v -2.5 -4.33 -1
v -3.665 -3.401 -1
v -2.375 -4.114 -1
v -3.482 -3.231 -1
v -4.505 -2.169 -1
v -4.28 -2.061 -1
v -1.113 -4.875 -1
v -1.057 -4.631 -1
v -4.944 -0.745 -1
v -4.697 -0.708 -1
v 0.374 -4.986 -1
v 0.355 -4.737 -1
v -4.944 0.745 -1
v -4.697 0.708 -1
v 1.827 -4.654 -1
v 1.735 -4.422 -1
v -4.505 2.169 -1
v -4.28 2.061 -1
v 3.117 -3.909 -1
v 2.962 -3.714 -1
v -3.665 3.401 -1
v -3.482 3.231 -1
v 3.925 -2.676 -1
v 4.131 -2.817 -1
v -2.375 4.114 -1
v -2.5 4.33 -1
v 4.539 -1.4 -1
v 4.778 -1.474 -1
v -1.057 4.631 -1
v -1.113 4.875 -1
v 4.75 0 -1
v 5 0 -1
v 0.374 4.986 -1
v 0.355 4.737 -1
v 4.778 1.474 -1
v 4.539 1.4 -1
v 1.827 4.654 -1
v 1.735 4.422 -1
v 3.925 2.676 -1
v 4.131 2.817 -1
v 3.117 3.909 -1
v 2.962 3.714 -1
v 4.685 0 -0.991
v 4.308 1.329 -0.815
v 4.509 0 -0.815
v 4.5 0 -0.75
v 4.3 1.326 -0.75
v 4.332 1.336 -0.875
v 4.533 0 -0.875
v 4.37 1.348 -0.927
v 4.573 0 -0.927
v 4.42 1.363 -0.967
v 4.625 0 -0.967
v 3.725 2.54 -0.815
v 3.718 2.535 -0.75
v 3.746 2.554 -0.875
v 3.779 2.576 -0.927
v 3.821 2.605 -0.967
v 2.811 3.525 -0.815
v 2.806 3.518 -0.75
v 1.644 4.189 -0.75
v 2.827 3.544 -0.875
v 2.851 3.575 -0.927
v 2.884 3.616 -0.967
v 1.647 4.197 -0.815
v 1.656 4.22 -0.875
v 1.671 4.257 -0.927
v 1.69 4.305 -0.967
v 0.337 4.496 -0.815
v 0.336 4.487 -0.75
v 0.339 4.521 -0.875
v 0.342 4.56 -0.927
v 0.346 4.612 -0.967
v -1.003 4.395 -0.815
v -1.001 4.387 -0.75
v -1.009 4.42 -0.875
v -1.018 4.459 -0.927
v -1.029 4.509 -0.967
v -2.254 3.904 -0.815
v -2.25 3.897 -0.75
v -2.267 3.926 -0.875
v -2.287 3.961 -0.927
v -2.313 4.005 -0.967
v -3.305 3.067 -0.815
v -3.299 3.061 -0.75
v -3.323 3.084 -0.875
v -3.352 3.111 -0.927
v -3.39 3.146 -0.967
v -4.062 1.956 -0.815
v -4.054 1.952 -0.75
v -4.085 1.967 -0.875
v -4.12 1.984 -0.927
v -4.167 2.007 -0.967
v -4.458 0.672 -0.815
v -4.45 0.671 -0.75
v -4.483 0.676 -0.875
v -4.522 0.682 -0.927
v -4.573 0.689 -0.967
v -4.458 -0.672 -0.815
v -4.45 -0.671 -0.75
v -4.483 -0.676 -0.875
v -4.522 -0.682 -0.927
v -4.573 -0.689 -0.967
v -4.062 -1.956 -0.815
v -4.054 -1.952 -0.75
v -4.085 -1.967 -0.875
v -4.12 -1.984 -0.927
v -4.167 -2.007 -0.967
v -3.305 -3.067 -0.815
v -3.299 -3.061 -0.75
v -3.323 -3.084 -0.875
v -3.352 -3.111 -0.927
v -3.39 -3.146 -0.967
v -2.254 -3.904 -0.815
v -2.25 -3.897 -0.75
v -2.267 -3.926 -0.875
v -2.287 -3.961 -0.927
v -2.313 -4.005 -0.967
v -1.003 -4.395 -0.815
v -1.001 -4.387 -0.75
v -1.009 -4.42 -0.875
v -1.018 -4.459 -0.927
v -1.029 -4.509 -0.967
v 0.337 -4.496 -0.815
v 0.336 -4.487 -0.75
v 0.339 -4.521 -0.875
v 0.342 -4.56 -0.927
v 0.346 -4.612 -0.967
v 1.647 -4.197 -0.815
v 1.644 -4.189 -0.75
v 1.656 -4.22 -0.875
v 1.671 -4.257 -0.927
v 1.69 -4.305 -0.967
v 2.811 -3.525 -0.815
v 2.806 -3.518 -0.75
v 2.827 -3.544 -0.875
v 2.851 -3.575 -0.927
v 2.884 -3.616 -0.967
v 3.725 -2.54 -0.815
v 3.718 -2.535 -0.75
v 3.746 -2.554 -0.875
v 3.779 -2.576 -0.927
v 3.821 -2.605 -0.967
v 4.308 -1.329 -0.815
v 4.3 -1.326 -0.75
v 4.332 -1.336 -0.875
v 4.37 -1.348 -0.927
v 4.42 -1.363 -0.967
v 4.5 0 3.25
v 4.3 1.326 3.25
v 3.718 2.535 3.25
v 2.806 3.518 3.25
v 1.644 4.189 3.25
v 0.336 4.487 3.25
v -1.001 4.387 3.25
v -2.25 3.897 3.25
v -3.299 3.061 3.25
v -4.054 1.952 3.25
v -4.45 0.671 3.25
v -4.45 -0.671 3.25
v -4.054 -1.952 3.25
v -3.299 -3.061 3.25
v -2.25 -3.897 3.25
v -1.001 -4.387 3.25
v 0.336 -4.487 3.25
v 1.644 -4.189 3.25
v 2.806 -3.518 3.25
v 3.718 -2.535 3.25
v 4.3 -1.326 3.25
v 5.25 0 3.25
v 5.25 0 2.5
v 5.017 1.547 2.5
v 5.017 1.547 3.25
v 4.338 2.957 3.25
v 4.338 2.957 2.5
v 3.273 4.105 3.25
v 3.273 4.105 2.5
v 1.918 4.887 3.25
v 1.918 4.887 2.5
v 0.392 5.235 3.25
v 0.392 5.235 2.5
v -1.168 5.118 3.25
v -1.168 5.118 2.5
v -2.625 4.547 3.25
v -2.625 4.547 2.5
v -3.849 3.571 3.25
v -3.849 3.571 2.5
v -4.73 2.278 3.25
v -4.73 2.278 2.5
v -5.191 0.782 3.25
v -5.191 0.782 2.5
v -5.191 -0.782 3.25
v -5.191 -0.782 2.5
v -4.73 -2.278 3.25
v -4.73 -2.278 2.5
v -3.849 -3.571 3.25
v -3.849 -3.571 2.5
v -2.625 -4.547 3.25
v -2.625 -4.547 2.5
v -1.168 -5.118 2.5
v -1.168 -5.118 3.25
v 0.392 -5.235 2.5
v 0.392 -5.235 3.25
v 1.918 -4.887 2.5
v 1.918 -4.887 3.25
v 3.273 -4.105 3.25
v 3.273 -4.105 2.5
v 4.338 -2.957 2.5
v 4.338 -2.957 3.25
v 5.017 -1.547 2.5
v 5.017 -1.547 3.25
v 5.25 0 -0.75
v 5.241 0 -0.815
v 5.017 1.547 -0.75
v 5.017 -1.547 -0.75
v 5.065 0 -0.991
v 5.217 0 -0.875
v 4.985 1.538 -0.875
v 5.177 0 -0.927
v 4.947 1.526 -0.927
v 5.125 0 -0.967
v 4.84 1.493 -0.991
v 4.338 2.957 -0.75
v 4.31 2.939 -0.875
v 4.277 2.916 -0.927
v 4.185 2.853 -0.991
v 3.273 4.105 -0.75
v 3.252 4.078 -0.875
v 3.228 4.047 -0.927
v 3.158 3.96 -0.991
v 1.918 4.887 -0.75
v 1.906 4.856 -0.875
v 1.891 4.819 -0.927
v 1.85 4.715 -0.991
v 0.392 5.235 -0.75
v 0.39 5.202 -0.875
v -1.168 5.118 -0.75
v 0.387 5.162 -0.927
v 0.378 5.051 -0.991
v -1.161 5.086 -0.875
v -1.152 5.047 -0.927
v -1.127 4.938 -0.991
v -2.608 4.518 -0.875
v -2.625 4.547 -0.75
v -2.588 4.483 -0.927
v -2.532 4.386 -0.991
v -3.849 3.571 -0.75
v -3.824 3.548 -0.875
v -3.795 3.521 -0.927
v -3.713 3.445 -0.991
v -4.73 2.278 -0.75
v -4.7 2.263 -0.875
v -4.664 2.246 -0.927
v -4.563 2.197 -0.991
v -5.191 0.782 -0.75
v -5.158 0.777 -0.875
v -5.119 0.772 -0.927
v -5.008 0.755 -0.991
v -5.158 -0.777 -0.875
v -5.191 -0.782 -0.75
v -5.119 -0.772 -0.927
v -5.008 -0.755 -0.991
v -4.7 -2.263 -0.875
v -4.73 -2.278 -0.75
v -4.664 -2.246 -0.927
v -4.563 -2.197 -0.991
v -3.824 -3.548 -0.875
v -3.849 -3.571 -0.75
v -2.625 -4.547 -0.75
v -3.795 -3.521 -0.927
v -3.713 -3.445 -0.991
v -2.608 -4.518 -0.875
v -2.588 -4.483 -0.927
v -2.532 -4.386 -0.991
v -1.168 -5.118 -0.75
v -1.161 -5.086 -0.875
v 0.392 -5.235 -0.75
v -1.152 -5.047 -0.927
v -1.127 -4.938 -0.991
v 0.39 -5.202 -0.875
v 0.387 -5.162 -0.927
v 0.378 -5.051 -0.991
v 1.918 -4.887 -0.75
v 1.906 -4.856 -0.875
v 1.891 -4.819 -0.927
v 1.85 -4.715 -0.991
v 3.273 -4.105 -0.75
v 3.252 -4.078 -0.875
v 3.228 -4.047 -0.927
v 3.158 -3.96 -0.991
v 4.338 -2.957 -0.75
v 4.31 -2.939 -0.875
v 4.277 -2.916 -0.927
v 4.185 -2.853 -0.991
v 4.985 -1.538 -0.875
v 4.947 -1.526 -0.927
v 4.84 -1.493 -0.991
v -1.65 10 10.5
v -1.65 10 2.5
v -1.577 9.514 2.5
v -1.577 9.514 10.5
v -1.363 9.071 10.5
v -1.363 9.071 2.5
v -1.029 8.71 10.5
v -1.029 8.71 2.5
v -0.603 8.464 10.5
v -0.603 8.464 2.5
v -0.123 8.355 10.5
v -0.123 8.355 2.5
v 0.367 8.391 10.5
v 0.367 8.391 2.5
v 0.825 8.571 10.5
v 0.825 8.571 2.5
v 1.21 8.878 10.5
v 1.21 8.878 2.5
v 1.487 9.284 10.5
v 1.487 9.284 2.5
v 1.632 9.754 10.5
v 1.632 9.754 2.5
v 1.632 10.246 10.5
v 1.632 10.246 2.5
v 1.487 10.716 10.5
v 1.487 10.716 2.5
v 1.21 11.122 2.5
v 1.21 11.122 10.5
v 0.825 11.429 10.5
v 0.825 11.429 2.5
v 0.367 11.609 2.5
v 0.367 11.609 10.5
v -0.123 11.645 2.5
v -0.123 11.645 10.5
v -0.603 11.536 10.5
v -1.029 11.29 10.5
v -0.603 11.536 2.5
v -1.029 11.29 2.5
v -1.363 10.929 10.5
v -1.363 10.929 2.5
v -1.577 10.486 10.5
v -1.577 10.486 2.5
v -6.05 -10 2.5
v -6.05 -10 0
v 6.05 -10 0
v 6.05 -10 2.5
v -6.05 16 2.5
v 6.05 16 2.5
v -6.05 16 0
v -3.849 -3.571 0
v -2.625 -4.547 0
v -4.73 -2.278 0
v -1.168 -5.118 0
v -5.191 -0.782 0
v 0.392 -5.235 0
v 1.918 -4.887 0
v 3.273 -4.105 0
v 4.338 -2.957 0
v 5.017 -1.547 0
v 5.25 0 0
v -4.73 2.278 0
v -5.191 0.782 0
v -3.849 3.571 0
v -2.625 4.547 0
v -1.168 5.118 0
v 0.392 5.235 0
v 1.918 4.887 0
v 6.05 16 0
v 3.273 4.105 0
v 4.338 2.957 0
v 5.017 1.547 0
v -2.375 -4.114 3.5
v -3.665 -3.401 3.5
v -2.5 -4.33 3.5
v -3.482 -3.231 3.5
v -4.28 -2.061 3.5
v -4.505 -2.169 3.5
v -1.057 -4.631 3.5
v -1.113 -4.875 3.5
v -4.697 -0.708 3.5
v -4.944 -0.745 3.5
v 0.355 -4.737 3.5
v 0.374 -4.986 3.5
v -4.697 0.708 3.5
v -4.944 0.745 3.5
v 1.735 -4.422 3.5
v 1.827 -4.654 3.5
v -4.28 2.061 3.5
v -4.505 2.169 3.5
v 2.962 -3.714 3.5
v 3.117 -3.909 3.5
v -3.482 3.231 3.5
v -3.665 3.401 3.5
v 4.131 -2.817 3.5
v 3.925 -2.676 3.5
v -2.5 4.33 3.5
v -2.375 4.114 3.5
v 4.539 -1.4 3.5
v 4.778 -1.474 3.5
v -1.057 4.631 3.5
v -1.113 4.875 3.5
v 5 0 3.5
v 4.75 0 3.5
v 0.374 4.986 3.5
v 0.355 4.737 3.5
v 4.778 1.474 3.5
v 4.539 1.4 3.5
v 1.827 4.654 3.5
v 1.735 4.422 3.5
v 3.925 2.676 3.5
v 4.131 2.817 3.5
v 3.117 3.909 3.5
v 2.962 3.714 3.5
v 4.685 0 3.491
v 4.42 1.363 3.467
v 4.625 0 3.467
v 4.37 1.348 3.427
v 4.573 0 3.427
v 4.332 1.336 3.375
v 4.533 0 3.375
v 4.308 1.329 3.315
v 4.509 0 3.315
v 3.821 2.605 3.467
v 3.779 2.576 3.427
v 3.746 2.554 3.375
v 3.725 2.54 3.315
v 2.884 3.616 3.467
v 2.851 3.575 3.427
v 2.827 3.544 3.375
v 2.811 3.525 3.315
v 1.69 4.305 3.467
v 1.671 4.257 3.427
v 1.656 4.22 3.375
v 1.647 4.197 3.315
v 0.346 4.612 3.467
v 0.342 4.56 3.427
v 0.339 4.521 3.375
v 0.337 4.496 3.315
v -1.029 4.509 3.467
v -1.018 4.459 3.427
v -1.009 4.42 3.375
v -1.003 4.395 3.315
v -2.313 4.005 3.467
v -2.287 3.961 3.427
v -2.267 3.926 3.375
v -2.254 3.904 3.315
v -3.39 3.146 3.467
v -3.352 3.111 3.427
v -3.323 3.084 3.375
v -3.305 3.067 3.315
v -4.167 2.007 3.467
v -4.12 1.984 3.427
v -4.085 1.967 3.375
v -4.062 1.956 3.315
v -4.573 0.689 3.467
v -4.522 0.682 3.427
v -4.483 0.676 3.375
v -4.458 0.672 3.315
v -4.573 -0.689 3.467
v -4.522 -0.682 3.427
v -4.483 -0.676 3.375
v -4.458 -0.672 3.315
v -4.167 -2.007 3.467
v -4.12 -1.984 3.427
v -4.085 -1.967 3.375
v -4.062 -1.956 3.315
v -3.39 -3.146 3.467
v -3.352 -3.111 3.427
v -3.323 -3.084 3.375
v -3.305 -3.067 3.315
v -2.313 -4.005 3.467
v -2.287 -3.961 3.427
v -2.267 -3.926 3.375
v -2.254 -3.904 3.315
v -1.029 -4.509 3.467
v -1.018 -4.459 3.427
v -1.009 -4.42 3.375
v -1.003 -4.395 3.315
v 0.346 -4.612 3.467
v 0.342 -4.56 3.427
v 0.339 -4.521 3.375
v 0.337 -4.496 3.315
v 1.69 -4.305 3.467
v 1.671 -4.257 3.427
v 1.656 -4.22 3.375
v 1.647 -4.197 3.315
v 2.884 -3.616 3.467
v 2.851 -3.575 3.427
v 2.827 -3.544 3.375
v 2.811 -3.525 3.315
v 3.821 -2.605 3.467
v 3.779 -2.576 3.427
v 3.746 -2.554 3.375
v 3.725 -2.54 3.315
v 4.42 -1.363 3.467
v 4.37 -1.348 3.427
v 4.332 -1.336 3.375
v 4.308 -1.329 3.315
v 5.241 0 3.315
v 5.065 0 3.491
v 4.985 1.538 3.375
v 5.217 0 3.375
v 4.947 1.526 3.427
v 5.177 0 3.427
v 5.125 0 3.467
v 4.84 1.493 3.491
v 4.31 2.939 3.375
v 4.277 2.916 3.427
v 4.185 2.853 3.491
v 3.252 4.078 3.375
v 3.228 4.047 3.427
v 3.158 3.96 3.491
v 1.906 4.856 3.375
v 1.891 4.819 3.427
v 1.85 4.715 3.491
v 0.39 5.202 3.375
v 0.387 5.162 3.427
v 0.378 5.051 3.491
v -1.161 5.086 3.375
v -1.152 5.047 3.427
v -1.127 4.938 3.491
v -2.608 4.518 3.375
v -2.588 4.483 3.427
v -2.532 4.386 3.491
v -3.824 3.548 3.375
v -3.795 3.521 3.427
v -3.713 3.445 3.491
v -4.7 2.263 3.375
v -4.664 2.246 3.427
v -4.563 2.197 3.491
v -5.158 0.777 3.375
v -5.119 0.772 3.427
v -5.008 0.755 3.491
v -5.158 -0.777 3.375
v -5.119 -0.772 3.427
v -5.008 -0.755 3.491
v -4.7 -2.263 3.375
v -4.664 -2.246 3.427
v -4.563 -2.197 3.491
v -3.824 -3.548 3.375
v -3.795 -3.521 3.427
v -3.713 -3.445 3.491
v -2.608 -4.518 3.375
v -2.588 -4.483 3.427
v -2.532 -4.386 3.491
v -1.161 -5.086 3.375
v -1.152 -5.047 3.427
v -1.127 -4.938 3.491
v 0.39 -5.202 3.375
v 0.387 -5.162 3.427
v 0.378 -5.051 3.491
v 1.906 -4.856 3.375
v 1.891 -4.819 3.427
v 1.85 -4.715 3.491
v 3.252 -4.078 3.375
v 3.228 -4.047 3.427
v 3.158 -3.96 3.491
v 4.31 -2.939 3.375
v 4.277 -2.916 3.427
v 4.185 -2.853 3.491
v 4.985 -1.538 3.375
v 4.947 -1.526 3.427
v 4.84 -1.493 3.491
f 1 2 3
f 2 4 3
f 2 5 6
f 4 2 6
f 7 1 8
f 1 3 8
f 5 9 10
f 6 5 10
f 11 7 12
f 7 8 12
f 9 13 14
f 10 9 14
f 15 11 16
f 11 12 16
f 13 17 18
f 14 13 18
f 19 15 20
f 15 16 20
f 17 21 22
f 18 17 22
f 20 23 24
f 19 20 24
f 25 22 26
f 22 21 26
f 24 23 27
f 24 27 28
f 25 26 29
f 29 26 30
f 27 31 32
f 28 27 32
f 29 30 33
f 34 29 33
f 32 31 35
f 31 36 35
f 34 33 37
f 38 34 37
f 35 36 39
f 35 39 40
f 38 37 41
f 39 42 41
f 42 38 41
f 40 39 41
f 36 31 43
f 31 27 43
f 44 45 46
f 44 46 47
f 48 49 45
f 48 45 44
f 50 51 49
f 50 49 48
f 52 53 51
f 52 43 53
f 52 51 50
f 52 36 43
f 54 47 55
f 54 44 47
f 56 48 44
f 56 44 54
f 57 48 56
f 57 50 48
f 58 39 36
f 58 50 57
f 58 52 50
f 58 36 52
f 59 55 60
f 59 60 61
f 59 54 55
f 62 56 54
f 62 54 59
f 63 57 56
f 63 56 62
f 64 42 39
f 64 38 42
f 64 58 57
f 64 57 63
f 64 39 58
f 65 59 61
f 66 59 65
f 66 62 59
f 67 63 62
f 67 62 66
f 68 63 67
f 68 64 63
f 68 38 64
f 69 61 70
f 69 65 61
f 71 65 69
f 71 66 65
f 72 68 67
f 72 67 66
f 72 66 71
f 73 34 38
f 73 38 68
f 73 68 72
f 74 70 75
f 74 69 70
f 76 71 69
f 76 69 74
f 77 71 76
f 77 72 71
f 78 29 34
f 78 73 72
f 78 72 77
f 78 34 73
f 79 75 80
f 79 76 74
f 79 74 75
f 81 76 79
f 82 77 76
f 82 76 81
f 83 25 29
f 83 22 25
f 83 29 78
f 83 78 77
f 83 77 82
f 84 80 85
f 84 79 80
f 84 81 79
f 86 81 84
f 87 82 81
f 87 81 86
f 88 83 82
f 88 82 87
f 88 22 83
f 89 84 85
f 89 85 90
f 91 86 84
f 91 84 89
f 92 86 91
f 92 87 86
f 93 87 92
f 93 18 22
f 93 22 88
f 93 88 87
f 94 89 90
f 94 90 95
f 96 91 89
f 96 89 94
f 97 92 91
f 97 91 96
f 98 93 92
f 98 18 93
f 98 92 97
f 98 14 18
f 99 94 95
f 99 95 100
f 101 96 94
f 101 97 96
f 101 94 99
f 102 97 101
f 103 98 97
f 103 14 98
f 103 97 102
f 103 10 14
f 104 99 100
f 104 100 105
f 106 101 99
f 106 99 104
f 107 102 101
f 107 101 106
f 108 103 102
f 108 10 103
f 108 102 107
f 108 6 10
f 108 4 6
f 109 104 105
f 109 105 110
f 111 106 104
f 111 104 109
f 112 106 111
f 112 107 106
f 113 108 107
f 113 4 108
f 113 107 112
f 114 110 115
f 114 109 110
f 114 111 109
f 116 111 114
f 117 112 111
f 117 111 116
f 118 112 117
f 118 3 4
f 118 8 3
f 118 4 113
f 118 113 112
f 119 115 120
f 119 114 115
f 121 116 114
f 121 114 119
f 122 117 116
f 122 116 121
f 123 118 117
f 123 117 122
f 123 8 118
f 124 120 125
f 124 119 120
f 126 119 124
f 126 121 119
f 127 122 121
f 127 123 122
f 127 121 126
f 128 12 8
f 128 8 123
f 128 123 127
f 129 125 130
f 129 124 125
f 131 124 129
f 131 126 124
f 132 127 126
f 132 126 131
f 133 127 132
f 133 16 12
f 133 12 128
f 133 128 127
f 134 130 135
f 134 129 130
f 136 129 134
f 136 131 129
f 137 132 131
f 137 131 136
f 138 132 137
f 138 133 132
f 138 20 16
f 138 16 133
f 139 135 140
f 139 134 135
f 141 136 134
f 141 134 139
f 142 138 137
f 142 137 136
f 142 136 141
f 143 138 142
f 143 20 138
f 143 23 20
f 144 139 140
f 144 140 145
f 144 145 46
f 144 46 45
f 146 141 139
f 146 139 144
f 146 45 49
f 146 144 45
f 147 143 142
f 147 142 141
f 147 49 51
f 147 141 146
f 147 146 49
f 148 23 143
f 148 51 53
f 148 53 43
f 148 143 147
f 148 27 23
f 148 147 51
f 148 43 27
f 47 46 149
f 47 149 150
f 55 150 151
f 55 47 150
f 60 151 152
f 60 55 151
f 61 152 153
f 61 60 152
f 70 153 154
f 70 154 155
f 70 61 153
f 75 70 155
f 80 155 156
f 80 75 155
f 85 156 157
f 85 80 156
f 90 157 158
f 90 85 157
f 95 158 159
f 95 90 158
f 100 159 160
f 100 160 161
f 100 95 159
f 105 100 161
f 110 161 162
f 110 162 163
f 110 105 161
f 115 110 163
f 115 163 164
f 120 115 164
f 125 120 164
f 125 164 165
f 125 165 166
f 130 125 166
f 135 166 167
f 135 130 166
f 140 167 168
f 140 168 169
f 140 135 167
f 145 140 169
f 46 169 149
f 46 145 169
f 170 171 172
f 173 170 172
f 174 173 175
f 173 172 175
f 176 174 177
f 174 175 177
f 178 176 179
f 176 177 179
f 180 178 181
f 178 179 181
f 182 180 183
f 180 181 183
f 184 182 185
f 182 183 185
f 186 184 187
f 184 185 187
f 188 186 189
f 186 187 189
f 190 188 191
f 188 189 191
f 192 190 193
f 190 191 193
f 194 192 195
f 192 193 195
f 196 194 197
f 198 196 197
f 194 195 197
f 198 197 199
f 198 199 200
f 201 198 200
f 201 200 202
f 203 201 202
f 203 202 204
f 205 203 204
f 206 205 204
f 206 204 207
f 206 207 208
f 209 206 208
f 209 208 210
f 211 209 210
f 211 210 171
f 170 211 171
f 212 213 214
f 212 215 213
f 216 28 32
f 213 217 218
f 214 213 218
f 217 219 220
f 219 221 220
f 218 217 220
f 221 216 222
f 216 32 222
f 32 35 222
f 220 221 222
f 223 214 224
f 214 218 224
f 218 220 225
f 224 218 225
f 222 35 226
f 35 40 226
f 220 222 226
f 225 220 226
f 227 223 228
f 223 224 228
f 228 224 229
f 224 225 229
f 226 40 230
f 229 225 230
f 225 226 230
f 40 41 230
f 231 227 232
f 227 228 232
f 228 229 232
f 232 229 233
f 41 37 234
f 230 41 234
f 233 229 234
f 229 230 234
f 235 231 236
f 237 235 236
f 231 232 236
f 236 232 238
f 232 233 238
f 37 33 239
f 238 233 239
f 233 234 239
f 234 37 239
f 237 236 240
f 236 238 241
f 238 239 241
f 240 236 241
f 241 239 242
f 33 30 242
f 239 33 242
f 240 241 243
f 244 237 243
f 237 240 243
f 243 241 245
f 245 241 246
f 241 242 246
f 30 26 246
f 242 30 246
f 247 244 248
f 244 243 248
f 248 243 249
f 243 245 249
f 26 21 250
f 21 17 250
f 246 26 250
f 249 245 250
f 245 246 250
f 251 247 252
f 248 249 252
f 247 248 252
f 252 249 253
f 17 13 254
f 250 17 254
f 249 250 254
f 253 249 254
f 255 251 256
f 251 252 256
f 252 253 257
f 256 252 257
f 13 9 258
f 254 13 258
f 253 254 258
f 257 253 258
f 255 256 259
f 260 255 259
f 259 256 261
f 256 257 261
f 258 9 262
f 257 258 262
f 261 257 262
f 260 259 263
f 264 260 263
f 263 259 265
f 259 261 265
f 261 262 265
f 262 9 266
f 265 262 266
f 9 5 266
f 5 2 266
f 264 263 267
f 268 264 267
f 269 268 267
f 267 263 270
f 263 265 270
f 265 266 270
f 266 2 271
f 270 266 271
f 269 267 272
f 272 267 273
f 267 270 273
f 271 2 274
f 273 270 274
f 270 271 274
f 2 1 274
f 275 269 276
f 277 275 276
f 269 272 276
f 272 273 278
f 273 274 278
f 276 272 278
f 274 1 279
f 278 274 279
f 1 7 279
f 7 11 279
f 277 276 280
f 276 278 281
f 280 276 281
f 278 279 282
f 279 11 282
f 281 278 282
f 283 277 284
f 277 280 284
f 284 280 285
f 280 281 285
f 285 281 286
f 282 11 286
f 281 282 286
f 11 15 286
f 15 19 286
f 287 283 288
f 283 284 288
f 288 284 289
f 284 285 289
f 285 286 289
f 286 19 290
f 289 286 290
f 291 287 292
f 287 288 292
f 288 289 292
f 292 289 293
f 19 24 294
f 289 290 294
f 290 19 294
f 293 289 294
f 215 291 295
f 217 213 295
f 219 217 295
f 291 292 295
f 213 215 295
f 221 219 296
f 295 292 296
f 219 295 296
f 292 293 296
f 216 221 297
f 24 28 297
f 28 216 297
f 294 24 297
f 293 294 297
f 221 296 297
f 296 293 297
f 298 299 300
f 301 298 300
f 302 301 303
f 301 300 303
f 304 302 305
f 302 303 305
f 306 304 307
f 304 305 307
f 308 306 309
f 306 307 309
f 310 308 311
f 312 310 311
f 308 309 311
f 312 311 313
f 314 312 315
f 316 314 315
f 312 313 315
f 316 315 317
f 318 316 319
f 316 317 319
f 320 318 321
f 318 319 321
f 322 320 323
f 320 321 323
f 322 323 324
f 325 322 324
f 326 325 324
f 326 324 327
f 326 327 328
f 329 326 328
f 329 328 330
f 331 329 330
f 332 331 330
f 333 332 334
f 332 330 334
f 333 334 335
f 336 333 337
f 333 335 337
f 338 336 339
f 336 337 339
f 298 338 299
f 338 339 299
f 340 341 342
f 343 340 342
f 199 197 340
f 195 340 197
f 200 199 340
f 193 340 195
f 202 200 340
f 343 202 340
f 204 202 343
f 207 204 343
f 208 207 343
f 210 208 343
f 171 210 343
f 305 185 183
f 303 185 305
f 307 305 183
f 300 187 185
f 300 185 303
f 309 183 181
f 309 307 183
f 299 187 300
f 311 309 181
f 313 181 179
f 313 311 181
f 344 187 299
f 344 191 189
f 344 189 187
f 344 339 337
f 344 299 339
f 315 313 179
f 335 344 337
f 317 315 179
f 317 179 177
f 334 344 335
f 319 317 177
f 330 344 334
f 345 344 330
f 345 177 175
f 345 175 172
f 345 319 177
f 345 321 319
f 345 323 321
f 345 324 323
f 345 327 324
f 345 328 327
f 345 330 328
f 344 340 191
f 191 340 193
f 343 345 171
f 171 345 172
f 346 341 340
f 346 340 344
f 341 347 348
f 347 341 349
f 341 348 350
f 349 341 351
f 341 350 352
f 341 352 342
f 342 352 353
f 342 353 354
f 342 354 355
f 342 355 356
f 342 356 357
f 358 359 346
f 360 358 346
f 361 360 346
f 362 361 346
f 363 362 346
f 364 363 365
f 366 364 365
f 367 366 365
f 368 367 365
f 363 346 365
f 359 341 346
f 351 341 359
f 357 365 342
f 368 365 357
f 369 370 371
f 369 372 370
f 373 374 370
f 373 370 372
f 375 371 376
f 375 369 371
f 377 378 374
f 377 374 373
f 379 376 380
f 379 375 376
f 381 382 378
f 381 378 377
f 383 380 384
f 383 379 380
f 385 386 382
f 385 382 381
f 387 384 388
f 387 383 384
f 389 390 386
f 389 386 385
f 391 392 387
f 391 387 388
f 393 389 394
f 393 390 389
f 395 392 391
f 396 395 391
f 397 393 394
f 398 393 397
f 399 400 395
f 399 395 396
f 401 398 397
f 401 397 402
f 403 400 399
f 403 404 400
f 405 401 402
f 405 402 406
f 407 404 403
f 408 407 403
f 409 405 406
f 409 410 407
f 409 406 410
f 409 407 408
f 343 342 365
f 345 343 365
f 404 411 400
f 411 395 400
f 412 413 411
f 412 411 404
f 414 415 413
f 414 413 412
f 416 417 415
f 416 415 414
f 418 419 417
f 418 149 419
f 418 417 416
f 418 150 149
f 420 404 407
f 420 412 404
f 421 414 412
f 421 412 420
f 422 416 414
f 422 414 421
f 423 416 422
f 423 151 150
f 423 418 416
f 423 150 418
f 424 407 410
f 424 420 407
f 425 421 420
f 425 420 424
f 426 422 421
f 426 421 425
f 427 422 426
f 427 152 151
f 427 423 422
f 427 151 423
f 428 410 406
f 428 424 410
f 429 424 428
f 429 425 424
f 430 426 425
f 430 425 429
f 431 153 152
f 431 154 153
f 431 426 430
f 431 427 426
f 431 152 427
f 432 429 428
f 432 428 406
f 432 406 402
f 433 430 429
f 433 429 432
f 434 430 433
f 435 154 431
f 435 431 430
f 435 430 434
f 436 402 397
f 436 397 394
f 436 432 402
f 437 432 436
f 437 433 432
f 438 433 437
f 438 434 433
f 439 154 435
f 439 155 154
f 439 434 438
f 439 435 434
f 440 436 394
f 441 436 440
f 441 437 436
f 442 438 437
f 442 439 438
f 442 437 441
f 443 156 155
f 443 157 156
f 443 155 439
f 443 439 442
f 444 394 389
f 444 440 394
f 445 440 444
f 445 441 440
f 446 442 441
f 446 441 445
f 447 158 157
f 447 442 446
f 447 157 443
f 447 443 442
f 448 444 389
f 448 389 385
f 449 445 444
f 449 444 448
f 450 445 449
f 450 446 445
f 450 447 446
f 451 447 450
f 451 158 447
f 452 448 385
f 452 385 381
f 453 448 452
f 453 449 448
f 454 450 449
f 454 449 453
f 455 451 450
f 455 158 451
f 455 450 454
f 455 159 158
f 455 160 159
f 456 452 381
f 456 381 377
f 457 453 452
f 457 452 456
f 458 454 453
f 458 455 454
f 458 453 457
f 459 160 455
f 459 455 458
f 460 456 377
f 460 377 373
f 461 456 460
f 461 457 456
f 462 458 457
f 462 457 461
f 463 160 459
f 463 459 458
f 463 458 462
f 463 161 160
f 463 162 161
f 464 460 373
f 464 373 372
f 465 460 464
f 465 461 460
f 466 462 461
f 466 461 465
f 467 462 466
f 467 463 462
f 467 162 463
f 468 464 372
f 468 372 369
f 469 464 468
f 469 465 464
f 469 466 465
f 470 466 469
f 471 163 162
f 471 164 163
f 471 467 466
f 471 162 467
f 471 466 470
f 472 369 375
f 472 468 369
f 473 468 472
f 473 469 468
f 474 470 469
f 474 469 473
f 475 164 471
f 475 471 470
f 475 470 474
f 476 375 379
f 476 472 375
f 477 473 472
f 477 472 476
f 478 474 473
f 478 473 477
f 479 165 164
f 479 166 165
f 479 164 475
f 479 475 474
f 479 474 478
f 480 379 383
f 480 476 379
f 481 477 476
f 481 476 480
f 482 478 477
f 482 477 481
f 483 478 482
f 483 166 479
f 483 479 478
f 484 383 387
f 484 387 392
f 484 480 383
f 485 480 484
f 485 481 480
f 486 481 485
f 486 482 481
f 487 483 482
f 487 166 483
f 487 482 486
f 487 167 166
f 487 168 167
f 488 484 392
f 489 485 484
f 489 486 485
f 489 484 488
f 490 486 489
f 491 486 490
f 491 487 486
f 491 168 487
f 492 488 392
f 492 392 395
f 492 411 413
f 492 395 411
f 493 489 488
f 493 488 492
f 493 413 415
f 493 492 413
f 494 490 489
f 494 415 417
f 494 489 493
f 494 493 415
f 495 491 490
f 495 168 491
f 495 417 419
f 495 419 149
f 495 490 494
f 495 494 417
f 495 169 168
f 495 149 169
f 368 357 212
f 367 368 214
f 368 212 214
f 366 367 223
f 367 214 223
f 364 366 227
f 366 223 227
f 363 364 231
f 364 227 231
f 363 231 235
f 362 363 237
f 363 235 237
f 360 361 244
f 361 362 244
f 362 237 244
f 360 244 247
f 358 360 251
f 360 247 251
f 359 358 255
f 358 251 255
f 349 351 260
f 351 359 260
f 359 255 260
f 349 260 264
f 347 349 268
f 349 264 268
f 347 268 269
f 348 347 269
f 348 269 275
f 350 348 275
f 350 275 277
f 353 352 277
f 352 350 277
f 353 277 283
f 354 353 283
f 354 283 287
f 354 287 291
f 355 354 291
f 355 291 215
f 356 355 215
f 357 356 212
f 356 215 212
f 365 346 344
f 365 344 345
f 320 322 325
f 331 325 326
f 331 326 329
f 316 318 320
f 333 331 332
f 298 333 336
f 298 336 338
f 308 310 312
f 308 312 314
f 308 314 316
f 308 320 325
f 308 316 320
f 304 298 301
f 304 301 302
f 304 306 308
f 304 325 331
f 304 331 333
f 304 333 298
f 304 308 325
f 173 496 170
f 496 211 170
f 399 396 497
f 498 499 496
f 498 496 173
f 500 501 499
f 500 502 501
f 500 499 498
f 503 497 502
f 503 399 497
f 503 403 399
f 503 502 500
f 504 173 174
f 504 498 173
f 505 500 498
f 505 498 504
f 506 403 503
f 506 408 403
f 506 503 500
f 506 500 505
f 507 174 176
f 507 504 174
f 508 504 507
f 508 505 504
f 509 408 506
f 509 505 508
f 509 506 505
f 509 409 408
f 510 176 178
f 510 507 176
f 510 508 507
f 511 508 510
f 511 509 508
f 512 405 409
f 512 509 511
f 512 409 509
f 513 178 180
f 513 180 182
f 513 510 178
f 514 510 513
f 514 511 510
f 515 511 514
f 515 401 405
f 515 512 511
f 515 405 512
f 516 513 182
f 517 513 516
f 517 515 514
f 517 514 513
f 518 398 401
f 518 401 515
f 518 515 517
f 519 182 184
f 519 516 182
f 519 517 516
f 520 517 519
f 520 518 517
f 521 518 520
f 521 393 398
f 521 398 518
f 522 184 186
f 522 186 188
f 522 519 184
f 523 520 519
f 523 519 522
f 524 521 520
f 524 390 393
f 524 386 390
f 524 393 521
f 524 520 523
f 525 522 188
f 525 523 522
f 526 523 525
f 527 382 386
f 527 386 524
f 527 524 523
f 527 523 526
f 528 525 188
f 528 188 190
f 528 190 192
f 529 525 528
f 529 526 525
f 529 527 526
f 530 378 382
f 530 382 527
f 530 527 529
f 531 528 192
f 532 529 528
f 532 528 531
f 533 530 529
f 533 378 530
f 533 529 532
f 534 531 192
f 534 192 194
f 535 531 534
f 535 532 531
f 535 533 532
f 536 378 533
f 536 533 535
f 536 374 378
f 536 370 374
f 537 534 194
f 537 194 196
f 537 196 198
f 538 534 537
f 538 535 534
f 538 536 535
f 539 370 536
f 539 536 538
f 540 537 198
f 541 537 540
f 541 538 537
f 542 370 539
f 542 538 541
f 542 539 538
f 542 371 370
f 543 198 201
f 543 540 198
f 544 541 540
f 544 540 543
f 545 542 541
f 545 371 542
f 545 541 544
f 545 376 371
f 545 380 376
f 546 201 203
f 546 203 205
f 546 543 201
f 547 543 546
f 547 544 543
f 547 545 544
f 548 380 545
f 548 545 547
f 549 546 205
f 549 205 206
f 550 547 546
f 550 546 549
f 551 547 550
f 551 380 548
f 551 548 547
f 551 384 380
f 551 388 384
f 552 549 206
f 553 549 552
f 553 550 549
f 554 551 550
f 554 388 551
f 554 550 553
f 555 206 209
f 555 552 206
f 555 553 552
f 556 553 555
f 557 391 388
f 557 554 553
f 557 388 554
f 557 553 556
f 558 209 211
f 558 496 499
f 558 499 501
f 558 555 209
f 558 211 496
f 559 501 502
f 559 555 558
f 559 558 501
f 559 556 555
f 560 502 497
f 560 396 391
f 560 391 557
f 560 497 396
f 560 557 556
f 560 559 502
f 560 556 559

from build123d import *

# Parameters (mm, degrees)
SKETCH_1_W           = 12.1
SKETCH_1_H           = 26
SKETCH_1_R           = 4.5
EXTRUDE_1_DEPTH      = 2.5
SKETCH_2_R           = 1.65
EXTRUDE_2_DEPTH      = 8
EXTRUDE_3_DEPTH      = 1
EXTRUDE_3_DEPTH_BACK = 3.5
SKETCH_3_R           = 5.25
SKETCH_3_R_2         = 4.5
FILLET_1_R           = 0.25


with BuildPart() as part:
    # Эскиз1 → Вытянуть1 (new body)
    with BuildSketch(Plane.XY):
        with Locations((0, 3)):
            Rectangle(SKETCH_1_W, SKETCH_1_H)
        Circle(SKETCH_1_R, mode=Mode.SUBTRACT)
    extrude(amount=EXTRUDE_1_DEPTH)

    # Эскиз2 → Вытянуть2 (add)
    with BuildSketch(Plane.XY.offset(2.5)):
        with Locations(Location((0, 10, 0), (0, 0, 180))):
            Circle(SKETCH_2_R)
    extrude(amount=EXTRUDE_2_DEPTH)

    # Эскиз3 → Вытянуть3 (add, two sides: drawn at the far end of the back side and taken through both)
    with BuildSketch(Plane.XY.offset(2.5).offset(-EXTRUDE_3_DEPTH_BACK)):
        Circle(SKETCH_3_R)
        Circle(SKETCH_3_R_2, mode=Mode.SUBTRACT)
    extrude(amount=EXTRUDE_3_DEPTH + EXTRUDE_3_DEPTH_BACK)

    # Скругление1
    fillet_1_edges = [part.edges().sort_by_distance(p)[0] for p in [
        (-4.5, 0, 3.5),
        (-5.25, 0, -1),
        (-4.5, 0, -1),
        (-5.25, 0, 3.5),
    ]]
    fillet(fillet_1_edges, radius=FILLET_1_R)


solid = part.part
